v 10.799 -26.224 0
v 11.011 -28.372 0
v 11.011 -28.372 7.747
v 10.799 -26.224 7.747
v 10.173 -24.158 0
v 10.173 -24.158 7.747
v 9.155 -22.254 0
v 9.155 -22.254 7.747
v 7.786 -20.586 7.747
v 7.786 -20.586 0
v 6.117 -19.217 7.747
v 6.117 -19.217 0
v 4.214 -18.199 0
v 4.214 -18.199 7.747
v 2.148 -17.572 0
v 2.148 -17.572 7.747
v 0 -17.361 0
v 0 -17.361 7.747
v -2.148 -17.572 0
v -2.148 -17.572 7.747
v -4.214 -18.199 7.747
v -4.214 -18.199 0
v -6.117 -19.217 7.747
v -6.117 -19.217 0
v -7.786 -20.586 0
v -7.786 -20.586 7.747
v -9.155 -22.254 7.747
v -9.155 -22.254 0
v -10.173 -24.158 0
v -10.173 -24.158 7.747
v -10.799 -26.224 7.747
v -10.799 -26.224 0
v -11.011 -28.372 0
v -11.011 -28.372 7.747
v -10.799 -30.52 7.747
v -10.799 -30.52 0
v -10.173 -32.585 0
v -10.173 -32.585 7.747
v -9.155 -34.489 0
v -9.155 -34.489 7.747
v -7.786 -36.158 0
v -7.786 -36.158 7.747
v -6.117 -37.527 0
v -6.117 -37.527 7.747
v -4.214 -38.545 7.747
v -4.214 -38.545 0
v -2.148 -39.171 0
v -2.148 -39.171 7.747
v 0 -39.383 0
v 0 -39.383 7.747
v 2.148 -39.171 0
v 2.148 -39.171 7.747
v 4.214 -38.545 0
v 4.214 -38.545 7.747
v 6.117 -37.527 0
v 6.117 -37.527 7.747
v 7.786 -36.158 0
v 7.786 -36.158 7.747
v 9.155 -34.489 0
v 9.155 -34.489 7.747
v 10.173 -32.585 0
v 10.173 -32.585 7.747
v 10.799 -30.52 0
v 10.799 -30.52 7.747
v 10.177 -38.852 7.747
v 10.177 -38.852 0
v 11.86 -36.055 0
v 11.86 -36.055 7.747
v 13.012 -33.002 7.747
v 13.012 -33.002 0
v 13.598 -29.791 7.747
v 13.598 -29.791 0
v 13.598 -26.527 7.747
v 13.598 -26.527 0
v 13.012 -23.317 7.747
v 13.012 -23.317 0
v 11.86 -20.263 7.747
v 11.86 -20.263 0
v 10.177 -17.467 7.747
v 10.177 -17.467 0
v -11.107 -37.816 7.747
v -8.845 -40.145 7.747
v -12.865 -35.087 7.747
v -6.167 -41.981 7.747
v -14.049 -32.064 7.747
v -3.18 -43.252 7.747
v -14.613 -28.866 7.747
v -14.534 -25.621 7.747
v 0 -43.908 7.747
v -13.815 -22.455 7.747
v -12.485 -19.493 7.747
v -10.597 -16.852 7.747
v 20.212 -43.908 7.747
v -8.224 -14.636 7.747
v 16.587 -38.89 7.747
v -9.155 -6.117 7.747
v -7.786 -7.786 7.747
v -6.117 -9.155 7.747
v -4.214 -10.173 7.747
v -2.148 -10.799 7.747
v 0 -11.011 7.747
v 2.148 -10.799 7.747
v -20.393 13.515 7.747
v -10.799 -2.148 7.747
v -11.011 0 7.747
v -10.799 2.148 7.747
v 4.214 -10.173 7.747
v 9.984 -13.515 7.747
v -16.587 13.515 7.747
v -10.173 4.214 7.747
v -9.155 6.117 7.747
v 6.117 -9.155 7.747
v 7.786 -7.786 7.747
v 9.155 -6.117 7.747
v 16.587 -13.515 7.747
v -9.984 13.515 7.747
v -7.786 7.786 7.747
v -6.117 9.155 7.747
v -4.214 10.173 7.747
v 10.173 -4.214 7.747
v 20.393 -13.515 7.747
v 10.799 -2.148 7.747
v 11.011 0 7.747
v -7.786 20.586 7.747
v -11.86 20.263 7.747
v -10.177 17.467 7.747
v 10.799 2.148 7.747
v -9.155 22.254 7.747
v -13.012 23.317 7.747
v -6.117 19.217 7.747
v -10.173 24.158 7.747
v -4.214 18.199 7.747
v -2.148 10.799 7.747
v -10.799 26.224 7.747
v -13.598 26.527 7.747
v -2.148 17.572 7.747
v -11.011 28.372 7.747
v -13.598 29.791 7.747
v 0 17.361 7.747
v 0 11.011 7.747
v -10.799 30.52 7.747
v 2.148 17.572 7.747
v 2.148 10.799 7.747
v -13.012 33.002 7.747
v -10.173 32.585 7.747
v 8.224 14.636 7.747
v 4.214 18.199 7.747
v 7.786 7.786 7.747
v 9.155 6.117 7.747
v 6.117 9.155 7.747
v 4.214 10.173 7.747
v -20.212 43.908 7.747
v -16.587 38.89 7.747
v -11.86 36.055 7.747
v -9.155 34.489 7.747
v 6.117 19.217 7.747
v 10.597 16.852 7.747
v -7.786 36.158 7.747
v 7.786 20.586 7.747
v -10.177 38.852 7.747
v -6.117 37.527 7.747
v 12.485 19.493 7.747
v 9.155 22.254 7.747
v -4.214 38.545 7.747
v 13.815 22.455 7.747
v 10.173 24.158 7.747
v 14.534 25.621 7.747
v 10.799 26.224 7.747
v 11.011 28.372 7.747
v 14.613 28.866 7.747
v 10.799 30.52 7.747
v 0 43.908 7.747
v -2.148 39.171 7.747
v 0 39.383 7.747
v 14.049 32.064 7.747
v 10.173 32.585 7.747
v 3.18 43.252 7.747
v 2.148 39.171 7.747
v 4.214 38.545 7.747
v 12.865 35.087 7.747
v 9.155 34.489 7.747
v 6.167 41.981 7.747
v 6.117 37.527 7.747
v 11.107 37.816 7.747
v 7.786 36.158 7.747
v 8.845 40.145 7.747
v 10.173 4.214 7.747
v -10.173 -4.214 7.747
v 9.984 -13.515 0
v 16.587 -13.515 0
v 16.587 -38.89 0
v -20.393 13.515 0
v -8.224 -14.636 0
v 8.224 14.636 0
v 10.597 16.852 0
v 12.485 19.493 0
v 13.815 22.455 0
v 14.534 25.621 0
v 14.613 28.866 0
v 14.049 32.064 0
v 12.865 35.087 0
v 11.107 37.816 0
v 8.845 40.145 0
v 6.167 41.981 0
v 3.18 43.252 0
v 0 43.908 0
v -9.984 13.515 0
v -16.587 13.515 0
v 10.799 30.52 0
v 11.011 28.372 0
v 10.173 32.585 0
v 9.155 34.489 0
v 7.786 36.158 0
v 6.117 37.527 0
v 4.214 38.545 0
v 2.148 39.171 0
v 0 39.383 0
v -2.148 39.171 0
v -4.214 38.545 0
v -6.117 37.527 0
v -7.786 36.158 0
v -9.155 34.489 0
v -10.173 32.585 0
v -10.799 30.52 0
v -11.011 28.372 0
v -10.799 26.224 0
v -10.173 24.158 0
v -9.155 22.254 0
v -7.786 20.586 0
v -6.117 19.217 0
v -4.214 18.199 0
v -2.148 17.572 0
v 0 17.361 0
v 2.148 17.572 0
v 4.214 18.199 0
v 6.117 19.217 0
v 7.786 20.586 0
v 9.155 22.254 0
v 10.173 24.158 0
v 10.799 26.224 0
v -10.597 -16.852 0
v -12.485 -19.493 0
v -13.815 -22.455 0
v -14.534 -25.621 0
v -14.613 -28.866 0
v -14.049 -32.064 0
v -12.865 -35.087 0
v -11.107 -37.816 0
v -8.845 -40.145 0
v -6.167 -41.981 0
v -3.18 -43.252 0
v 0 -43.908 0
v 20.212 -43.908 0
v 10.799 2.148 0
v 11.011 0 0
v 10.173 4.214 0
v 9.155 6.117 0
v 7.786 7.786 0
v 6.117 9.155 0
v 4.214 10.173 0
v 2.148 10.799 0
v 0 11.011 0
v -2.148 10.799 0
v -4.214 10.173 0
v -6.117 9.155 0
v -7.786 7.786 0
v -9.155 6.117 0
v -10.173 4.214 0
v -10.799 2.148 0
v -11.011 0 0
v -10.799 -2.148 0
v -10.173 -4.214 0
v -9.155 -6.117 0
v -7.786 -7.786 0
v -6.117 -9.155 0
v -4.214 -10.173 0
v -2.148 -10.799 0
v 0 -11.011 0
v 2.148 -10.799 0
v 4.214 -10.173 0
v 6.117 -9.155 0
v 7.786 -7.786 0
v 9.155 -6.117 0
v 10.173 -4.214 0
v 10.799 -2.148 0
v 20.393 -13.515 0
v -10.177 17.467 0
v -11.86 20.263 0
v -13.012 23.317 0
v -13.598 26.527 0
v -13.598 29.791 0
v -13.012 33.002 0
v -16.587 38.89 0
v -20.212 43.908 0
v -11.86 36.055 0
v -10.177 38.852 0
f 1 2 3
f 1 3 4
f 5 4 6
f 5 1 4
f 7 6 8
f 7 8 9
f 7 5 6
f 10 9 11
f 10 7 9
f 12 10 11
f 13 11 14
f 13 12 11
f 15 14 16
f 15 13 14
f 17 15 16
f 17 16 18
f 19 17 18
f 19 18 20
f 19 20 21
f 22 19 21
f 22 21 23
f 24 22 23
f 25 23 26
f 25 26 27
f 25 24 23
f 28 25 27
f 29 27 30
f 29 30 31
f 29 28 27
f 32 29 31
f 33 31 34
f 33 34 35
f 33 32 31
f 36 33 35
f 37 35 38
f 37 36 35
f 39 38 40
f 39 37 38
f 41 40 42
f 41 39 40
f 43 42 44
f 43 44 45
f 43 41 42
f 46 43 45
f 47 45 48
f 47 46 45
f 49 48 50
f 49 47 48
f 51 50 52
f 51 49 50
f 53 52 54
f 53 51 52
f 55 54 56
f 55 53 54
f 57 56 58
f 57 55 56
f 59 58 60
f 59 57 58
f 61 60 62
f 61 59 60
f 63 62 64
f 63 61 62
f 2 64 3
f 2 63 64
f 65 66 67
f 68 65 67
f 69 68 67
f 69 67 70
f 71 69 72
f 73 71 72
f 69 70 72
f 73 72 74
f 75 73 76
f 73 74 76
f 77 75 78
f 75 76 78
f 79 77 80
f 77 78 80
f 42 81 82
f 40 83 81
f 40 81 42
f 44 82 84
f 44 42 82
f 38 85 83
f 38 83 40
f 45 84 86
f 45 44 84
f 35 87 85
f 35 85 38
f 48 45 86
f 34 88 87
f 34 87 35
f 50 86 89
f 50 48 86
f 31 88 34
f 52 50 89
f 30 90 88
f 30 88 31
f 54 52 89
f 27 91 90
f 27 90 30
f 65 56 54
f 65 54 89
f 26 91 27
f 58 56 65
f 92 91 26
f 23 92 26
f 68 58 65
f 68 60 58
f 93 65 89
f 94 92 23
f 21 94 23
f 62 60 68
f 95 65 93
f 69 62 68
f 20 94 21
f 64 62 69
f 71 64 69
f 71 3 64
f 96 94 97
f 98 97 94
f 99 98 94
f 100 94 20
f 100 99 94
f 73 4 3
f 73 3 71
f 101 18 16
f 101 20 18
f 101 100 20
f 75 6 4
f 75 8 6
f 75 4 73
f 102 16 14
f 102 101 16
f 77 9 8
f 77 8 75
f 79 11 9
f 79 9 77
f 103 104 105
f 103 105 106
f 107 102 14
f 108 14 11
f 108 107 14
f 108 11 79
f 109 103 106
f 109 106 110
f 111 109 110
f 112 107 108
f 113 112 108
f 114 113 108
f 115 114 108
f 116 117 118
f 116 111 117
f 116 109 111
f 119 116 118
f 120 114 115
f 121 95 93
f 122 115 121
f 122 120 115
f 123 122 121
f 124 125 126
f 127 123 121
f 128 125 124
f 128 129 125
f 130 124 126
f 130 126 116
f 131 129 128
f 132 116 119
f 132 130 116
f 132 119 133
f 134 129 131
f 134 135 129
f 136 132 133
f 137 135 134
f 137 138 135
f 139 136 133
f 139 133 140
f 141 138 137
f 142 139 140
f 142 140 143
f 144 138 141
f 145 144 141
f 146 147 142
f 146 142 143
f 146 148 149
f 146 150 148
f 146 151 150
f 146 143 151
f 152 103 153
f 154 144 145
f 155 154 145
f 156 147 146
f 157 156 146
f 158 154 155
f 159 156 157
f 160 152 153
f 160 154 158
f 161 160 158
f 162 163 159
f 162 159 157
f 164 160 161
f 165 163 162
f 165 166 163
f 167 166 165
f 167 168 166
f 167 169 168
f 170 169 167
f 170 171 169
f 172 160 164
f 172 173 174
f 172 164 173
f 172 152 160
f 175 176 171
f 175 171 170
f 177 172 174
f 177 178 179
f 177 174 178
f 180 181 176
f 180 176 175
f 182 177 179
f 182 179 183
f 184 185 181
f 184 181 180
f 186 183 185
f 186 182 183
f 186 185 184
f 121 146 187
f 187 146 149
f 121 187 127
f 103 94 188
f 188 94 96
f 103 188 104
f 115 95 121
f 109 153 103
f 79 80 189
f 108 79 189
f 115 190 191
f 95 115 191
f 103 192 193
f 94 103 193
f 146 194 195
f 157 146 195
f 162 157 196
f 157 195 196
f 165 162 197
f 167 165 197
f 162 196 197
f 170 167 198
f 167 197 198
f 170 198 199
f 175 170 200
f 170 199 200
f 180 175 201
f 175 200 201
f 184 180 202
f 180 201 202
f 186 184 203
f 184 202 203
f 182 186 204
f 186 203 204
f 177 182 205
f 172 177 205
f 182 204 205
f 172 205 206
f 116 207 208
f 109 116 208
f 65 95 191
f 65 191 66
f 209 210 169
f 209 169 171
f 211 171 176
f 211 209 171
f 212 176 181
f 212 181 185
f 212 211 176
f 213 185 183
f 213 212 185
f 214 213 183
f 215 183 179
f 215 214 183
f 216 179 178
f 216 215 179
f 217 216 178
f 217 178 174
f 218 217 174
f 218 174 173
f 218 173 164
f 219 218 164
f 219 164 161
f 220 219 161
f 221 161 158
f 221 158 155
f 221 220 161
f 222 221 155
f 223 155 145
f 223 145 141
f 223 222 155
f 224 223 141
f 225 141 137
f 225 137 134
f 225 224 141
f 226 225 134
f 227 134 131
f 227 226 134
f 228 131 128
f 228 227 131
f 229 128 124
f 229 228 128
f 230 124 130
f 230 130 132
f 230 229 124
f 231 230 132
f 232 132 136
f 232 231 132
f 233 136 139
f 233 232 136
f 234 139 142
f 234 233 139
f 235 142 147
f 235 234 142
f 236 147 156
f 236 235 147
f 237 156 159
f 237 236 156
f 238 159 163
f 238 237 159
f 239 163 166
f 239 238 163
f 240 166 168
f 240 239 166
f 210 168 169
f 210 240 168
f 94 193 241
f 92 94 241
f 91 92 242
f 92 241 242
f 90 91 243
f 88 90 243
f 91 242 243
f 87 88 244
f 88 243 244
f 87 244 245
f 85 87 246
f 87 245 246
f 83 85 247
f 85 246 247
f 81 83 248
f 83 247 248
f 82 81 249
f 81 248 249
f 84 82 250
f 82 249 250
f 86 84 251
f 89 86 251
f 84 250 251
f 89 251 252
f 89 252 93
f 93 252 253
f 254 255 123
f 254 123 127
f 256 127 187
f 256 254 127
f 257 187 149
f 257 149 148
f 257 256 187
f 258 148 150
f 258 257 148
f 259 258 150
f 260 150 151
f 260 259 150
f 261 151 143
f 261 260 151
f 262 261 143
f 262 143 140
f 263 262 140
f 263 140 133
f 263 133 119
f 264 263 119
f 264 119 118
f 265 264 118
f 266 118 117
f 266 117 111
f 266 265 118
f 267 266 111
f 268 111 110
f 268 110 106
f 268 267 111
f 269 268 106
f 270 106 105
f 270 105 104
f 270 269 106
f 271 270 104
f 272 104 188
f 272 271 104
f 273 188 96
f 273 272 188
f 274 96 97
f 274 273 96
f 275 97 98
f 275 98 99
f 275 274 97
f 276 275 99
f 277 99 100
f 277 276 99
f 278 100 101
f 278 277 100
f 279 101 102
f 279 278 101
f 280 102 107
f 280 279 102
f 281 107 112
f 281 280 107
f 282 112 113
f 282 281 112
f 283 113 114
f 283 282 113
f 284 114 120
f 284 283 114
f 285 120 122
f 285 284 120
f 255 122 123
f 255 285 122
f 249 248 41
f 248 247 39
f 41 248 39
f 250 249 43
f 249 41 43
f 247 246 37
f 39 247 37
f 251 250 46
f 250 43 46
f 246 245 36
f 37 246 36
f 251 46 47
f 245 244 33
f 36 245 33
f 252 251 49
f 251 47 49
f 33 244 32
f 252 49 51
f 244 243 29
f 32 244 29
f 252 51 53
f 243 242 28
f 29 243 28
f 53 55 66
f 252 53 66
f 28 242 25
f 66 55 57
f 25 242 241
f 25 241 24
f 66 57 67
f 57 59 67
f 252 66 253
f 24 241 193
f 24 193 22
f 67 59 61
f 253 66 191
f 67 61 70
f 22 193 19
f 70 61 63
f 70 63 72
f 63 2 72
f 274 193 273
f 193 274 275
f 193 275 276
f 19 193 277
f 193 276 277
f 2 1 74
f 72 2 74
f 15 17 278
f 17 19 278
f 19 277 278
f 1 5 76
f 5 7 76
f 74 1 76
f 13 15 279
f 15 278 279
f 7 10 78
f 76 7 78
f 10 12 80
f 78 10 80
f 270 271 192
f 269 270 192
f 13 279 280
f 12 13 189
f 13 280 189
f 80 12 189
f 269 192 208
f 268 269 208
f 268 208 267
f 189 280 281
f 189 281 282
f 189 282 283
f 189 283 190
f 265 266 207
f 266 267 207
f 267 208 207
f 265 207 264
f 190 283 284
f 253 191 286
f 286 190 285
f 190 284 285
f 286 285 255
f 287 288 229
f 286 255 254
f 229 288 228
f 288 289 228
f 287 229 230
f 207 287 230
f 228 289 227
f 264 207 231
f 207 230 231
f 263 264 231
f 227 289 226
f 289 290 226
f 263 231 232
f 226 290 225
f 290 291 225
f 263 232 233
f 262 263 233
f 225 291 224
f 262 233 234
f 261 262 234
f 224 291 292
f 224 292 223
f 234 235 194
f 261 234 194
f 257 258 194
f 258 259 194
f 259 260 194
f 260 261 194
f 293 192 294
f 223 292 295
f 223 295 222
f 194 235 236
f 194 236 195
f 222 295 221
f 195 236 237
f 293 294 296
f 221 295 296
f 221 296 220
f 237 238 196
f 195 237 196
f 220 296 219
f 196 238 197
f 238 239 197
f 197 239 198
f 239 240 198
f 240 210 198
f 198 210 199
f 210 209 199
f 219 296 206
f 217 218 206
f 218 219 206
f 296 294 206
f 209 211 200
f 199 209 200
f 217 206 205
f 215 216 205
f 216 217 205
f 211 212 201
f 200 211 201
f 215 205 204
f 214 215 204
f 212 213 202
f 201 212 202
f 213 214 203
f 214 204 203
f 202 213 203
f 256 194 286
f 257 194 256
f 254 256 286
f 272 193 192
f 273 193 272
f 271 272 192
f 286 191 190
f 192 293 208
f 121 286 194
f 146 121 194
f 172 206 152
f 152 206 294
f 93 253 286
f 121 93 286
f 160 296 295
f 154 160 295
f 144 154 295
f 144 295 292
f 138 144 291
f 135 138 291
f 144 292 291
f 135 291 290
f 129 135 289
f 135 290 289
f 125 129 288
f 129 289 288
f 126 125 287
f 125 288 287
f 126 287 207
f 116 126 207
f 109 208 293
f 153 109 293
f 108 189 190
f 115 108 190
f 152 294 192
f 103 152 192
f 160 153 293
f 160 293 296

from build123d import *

# Parameters (mm, degrees)
F0_R     = 11.0109
F1_DEPTH = 7.747


with BuildPart() as f1:
    # F0 (on Top) → F1 (new body)
    with BuildSketch(Plane.XY):
        with BuildLine():
            Line((20.392826, -13.514568), (8.224028, 14.635976))
            ThreePointArc((8.224028, 14.635976), (14.048919, 32.063751), (0, 43.907929))
            Line((0, 43.907929), (-20.211583, 43.907929))
            Line((-20.211583, 43.907929), (-20.392826, 13.514568))
            Line((-20.392826, 13.514568), (-8.224028, -14.635976))
            ThreePointArc((-8.224028, -14.635976), (-14.048919, -32.063751), (0, -43.907929))
            Line((0, -43.907929), (20.211583, -43.907929))
            Line((20.211583, -43.907929), (20.392826, -13.514568))
        make_face()
        with Locations((0, -28.3718)):
            Circle(F0_R, mode=Mode.SUBTRACT)
        with BuildLine():
            Line((16.587436, -13.514568), (16.587436, -38.889877))
            Line((16.587436, -38.889877), (10.177375, -38.851653))
            ThreePointArc((10.177375, -38.851653), (13.6719, -28.159103), (10.177375, -17.466553))
            Line((10.177375, -17.466553), (9.983805, -13.514568))
            Line((9.983805, -13.514568), (16.587436, -13.514568))
        make_face(mode=Mode.SUBTRACT)
        with BuildLine():
            Line((-16.587436, 13.514568), (-16.587436, 38.889877))
            Line((-16.587436, 38.889877), (-10.177375, 38.851653))
            ThreePointArc((-10.177375, 38.851653), (-13.6719, 28.159103), (-10.177375, 17.466553))
            Line((-10.177375, 17.466553), (-9.983805, 13.514568))
            Line((-9.983805, 13.514568), (-16.587436, 13.514568))
        make_face(mode=Mode.SUBTRACT)
        Circle(F0_R, mode=Mode.SUBTRACT)
        with Locations((0, 28.3718)):
            Circle(F0_R, mode=Mode.SUBTRACT)
    extrude(amount=F1_DEPTH)


solid = f1.part
